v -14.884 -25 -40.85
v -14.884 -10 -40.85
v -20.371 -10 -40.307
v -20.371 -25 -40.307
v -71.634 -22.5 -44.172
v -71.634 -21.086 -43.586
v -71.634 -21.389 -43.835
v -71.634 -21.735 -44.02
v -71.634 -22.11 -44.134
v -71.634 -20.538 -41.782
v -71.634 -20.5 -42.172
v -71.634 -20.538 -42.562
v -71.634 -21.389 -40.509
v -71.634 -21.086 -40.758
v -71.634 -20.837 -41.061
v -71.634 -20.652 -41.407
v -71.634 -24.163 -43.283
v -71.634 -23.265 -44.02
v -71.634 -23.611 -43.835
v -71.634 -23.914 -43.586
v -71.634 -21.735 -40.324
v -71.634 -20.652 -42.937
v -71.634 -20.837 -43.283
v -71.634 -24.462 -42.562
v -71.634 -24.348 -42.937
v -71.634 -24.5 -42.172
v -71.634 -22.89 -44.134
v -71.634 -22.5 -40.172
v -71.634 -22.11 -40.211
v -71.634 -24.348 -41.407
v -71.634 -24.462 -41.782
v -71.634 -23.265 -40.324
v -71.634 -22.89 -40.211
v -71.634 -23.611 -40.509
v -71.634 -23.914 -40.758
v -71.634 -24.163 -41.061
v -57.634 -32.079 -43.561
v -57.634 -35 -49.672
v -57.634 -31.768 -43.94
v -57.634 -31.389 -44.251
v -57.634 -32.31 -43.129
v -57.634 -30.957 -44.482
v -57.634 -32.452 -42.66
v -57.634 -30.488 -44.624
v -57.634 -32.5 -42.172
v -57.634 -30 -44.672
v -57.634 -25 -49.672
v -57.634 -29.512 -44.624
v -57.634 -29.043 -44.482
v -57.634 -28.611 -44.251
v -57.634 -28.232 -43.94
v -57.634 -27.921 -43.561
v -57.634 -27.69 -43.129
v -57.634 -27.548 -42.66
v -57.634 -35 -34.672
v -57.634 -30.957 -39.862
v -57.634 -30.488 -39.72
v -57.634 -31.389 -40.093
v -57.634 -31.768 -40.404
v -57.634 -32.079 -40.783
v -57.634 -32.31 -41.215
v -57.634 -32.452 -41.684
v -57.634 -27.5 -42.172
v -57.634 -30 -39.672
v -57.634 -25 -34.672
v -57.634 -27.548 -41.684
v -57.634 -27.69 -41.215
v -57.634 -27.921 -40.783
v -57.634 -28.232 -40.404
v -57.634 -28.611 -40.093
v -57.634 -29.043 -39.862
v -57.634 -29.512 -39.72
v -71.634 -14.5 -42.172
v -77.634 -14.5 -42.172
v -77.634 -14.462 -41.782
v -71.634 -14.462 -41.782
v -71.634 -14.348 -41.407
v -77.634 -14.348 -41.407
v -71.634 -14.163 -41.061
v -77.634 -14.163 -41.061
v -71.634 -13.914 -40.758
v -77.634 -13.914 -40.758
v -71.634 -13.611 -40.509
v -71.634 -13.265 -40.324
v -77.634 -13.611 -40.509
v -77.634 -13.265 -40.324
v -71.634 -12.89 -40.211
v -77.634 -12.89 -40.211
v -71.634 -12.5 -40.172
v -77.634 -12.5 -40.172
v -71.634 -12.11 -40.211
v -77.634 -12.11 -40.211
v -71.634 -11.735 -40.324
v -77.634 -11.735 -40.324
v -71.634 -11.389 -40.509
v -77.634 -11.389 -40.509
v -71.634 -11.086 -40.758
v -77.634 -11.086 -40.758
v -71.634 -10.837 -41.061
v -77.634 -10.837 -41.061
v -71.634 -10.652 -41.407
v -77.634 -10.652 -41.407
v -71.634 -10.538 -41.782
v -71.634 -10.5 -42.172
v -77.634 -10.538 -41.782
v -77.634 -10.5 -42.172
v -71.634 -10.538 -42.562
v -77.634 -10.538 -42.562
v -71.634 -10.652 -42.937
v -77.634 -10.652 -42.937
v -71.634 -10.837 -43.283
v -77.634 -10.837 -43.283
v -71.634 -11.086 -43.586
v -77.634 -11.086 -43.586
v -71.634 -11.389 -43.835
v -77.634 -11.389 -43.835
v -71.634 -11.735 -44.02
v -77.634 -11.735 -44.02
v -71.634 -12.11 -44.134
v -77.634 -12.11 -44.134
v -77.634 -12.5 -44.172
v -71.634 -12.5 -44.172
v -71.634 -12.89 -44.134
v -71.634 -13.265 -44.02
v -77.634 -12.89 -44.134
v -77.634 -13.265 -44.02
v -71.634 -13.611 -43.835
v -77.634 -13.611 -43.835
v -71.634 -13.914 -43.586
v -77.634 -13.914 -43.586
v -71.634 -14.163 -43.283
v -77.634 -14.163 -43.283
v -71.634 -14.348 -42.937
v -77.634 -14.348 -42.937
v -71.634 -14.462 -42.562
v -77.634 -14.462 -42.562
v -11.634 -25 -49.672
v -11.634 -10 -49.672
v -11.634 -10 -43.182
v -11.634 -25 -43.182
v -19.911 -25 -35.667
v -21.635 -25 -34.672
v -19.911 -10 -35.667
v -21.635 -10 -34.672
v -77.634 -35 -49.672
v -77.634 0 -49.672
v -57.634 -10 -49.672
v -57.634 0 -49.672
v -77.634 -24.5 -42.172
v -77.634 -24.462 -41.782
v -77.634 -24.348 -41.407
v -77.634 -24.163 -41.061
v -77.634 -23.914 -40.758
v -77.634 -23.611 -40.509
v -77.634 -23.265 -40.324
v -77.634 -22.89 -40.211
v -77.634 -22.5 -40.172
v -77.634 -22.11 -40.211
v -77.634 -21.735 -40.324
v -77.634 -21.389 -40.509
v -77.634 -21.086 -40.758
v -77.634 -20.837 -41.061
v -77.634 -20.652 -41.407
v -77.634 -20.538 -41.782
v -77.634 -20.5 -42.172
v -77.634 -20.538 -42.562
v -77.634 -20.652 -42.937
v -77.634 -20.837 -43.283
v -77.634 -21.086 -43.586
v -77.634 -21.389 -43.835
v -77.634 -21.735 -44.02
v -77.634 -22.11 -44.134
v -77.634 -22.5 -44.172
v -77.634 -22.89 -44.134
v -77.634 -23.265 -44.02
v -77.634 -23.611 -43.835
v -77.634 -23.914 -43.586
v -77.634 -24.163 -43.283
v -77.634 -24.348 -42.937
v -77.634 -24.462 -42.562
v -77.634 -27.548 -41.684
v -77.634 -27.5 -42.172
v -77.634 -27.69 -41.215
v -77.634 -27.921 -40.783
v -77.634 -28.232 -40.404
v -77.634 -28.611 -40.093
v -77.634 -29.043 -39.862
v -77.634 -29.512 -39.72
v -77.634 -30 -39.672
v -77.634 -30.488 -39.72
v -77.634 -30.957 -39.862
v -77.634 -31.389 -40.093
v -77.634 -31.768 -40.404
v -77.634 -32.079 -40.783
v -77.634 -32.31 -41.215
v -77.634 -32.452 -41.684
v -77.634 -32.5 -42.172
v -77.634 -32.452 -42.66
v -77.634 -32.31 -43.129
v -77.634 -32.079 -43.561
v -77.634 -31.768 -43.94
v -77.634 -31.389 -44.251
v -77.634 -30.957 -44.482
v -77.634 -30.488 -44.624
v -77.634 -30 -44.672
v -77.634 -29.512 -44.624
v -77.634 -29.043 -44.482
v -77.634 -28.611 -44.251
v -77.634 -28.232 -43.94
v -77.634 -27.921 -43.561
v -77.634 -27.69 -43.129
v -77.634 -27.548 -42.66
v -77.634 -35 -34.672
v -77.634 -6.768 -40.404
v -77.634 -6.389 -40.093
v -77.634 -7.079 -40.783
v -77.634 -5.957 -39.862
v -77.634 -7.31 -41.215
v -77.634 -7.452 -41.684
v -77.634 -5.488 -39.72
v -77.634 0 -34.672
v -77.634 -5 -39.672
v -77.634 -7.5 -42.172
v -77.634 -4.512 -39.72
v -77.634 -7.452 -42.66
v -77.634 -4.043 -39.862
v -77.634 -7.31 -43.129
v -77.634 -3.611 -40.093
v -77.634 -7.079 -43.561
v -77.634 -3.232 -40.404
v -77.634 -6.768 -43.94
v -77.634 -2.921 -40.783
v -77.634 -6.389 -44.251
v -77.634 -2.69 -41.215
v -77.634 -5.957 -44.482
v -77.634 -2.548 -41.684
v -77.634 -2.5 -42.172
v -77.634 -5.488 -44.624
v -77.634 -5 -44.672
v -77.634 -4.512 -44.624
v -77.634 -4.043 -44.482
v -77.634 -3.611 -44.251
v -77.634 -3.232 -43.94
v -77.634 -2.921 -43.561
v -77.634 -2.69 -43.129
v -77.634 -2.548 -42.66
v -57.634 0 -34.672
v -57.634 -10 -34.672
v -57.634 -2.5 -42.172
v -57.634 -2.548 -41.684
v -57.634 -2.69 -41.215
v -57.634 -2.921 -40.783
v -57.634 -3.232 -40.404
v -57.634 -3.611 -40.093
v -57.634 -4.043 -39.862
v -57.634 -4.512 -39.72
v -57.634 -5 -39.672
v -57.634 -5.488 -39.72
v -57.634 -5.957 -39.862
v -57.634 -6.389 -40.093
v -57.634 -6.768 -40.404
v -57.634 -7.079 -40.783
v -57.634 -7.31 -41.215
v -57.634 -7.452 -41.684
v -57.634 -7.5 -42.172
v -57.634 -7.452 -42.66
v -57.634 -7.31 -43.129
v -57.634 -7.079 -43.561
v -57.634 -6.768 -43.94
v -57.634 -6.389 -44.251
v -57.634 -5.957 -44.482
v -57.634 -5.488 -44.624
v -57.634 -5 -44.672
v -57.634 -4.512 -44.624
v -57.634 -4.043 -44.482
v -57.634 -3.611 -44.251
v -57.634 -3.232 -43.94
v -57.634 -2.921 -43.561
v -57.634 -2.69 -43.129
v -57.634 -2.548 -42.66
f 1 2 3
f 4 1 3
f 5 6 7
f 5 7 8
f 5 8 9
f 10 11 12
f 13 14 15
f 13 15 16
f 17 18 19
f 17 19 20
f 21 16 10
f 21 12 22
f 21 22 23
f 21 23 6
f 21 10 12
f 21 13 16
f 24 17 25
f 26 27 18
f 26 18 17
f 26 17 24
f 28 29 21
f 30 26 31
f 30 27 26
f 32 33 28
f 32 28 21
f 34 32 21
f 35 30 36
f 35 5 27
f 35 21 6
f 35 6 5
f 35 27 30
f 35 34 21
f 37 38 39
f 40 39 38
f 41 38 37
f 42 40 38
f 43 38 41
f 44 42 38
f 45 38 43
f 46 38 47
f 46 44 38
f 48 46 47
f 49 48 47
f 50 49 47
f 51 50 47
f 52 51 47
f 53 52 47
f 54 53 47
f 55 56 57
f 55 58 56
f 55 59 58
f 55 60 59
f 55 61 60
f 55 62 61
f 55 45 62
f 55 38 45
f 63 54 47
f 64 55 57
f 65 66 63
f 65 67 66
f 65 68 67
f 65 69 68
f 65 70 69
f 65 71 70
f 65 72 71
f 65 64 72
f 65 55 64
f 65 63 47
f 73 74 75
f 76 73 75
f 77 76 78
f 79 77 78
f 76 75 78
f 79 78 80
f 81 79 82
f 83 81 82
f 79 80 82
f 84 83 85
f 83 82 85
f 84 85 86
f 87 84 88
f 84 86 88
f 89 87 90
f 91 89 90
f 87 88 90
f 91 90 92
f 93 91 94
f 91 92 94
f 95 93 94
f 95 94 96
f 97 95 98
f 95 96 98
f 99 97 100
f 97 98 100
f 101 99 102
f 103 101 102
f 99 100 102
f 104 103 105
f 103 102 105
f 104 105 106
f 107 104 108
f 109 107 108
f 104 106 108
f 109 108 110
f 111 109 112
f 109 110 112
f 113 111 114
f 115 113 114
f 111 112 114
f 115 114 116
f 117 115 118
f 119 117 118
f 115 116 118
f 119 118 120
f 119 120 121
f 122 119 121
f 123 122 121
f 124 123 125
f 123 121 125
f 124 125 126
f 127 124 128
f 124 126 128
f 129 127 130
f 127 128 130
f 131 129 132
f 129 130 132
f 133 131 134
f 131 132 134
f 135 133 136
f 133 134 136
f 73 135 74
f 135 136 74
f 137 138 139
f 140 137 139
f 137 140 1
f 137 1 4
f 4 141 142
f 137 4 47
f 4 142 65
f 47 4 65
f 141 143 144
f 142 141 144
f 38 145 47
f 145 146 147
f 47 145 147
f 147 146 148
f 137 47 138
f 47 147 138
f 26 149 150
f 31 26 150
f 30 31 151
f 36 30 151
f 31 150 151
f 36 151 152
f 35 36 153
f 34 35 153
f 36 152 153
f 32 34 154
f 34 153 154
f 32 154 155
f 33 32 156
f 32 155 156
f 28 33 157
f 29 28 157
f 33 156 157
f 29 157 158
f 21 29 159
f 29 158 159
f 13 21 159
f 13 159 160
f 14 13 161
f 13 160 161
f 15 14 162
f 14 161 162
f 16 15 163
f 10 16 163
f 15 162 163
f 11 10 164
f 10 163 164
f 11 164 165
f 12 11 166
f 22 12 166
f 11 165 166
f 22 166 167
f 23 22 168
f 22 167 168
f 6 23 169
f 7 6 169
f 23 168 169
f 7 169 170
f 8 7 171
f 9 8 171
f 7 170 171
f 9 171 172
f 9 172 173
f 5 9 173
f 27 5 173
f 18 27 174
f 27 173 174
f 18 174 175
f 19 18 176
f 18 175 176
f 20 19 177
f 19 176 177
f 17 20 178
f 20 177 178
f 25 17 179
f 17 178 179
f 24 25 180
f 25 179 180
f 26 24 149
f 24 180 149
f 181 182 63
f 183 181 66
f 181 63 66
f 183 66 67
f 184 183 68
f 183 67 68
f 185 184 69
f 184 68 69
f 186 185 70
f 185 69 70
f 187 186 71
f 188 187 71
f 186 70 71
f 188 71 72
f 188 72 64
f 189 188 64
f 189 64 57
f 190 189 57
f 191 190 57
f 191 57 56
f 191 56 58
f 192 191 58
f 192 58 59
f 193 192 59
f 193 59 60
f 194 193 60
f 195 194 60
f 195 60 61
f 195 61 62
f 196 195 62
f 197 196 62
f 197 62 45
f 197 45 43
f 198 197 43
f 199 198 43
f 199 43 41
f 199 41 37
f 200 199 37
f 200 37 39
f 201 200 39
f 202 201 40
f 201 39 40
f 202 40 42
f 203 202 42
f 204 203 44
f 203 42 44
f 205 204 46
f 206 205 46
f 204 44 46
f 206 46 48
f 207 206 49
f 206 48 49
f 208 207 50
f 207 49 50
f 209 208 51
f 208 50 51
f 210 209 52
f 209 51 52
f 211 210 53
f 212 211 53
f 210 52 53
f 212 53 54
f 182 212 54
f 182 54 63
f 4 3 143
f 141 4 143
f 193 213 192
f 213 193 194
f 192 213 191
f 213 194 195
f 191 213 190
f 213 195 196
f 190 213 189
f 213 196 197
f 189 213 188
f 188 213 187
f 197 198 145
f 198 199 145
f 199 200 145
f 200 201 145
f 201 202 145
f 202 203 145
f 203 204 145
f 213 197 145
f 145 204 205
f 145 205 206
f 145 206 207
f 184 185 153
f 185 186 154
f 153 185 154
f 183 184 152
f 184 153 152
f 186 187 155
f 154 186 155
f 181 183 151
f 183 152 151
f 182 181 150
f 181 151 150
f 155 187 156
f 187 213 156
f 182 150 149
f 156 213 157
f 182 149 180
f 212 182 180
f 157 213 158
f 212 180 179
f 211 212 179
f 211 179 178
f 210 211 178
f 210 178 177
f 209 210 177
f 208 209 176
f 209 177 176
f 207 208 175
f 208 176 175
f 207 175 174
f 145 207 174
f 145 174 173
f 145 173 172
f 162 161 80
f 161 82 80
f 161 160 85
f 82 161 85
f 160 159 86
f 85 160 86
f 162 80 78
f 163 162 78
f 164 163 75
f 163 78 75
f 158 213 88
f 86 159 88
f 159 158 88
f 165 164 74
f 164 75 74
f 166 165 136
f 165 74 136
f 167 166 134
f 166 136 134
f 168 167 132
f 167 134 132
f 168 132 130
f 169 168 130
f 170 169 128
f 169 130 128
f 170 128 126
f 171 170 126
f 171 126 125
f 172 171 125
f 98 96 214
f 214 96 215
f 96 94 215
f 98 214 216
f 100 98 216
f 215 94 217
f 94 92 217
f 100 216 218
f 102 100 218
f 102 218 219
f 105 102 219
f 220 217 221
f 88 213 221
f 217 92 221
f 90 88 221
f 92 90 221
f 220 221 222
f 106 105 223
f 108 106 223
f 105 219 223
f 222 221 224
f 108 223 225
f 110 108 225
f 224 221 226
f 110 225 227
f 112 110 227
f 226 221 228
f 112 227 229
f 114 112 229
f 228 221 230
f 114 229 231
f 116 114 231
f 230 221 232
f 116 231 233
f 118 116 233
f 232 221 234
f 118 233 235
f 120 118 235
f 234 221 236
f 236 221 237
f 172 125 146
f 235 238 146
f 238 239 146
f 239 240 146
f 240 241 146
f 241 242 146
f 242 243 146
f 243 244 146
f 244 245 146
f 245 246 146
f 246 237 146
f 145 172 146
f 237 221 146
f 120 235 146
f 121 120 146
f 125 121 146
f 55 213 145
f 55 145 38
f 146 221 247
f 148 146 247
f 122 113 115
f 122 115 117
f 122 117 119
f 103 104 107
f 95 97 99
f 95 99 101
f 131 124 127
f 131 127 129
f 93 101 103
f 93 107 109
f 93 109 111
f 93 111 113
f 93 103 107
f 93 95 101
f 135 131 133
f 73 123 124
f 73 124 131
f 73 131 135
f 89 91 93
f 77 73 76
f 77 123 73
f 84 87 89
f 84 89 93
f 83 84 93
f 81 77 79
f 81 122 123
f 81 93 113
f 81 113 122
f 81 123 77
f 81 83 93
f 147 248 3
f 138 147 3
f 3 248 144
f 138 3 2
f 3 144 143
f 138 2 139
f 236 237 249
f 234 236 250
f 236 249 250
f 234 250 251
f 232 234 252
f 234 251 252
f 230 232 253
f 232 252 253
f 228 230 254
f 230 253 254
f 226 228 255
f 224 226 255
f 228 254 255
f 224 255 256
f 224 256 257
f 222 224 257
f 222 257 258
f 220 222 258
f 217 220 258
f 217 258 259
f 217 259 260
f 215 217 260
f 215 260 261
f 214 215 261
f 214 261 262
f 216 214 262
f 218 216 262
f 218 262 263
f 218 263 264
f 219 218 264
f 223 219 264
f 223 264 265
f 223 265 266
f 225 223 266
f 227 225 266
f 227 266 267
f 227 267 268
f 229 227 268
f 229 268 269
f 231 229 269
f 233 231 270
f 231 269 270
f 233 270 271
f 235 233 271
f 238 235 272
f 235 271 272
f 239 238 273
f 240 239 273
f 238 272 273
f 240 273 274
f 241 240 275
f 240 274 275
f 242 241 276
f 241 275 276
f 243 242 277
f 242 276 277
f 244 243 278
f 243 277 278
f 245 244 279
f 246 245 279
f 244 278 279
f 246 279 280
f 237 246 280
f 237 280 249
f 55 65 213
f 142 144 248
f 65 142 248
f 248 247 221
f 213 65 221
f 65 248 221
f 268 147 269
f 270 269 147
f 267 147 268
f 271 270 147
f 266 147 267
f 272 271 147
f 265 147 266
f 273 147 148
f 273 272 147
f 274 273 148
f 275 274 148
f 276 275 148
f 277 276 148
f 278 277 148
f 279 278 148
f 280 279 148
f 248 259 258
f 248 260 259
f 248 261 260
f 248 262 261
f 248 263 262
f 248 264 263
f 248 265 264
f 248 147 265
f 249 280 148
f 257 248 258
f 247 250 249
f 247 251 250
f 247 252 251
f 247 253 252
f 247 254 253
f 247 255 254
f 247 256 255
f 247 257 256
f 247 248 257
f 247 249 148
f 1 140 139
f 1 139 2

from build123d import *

# Parameters (mm, degrees)
F0_W     = 20
F0_H     = 7.5
F1_DEPTH = 35
F2_W     = 35.998606
F2_H     = 10
F2_W_2   = 10.001394
F3_DEPTH = 15.001
F4_R     = 2.5
F5_DEPTH = 20.001
F6_R     = 2
F7_DEPTH = 6


with BuildPart() as f1:
    # F0 (on Front) → F1 (new body)
    with BuildSketch(Plane.XZ):
        with Locations((-67.633515, -45.922072)):
            Rectangle(F0_W, F0_H)
        with Locations((-67.633515, -38.422072)):
            Rectangle(F0_W, F0_H)
        Polygon((-11.633515, -49.672072), (-11.633515, -43.181855), (-14.883661, -40.850213), (-20.370748, -40.306831), (-19.911289, -35.667204), (-21.634909, -34.672072), (-57.633515, -34.672072), (-57.633515, -42.172072), (-57.633515, -49.672072), align=None)
    extrude(amount=F1_DEPTH)

    # F2 (on face) → F3 (cut, through all)
    with BuildSketch(Plane.XY.offset(-34.672072)):
        with Locations((-39.634212, -5)):
            Rectangle(F2_W, F2_H)
        with Locations((-16.634212, -30)):
            Rectangle(F2_W_2, F2_H)
        with Locations((-16.634212, -5)):
            Rectangle(F2_W_2, F2_H)
        with Locations((-39.634212, -30)):
            Rectangle(F2_W, F2_H)
    extrude(amount=-F3_DEPTH, mode=Mode.SUBTRACT)

    # F4 (on face) → F5 (cut, through all)
    with BuildSketch(Plane.YZ.offset(-57.633515)):
        with Locations((-30, -42.172072)):
            Circle(F4_R)
        with Locations((-5, -42.172072)):
            Circle(F4_R)
    extrude(amount=-F5_DEPTH, mode=Mode.SUBTRACT)

    # F6 (on face) → F7 (cut)
    with BuildSketch(Plane(origin=(-77.633515, 0, 0), x_dir=(0, -1, 0), z_dir=(-1, 0, 0))):
        with Locations((12.5, -42.172072)):
            Circle(F6_R)
        with Locations((22.5, -42.172072)):
            Circle(F6_R)
    extrude(amount=-F7_DEPTH, mode=Mode.SUBTRACT)


solid = f1.part
